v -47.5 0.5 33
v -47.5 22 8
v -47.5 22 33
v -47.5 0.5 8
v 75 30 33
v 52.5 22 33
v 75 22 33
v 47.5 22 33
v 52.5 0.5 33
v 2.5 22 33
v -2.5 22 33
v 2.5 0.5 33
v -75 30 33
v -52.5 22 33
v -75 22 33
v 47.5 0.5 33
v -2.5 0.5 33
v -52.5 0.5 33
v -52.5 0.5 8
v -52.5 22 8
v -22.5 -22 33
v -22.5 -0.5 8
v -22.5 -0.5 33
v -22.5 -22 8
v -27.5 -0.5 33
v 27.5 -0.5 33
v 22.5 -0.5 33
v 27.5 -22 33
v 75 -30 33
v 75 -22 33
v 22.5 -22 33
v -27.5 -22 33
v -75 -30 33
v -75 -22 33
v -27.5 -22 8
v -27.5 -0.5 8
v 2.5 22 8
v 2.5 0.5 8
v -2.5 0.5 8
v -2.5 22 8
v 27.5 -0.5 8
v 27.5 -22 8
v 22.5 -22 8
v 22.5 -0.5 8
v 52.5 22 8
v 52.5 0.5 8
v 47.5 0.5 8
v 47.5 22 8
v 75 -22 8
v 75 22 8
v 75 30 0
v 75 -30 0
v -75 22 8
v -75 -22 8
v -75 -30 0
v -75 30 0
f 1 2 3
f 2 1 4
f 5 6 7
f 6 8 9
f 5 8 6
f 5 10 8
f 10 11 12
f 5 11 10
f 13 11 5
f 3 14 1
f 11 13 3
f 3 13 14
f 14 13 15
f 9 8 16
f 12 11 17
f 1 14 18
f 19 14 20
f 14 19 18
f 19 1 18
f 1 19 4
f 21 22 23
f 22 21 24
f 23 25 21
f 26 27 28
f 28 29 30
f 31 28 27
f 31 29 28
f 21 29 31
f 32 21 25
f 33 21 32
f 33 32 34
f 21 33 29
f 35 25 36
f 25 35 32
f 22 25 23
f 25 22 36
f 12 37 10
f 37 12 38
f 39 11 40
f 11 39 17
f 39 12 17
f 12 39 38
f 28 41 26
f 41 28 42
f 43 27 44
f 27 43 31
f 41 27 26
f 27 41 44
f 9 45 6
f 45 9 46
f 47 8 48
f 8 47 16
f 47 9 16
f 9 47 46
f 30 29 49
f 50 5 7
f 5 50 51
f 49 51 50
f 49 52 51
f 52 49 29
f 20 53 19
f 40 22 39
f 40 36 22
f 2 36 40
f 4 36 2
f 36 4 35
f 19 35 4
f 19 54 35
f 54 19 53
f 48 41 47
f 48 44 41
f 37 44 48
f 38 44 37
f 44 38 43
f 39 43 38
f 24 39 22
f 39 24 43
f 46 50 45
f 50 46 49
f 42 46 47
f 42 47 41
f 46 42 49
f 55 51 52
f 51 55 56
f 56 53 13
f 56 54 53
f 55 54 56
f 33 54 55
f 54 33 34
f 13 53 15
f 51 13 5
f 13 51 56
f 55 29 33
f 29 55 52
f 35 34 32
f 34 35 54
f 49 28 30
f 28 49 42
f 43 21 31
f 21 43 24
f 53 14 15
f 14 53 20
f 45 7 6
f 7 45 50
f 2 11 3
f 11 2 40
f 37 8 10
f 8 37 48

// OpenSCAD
$fn = 32;

// ----------------------------------------------------------------------
// Rib frame 150 x 60 x 33
// 5 ribs at 25 mm pitch, staggered
// ----------------------------------------------------------------------

// --- parameters (mm) ---
frame = [150, 60, 8];  // base plate size (x, y, z)
rail_w = 8;            // side rail width
ribs = 5;              // number of ribs
rib_t = 5;             // rib thickness
rib_h = 25;            // rib height above the base plate
pitch = 25;            // pitch between rib centres

// --- derived feature positions (mm) ---
span = (ribs - 1) * pitch;          // = 100   distance between the outer ribs
origin_x = -span / 2;               // = -50   X of the first rib
rib_len = frame[1] / 2 - rail_w + 0.5;  // = 22.5   length of a staggered rib
rib_y = 0.5 + rib_len / 2;          // = 11.75   Y of a staggered rib centre
row_offset = 2 * rib_y;             // = 23.5   distance between the two rows
feature_centers = [
  [origin_x + 0 * pitch, rib_y],
  [origin_x + 1 * pitch, -rib_y],
  [origin_x + 2 * pitch, rib_y],
  [origin_x + 3 * pitch, -rib_y],
  [origin_x + 4 * pitch, rib_y]
];   // rib centre line, drives the rib loop

// base plate, two side rails, then the ribs read straight off feature_centers
union() {
  translate([-frame[0] / 2, -frame[1] / 2, 0]) cube(frame);
  translate([-frame[0] / 2, -frame[1] / 2, 0]) cube([frame[0], rail_w, frame[2] + rib_h]);
  translate([-frame[0] / 2, frame[1] / 2 - rail_w, 0]) cube([frame[0], rail_w, frame[2] + rib_h]);
  for (centre = feature_centers)
    translate([centre[0] - rib_t / 2, centre[1] - rib_len / 2, frame[2] - 1])
      cube([rib_t, rib_len, rib_h + 1]);
}
